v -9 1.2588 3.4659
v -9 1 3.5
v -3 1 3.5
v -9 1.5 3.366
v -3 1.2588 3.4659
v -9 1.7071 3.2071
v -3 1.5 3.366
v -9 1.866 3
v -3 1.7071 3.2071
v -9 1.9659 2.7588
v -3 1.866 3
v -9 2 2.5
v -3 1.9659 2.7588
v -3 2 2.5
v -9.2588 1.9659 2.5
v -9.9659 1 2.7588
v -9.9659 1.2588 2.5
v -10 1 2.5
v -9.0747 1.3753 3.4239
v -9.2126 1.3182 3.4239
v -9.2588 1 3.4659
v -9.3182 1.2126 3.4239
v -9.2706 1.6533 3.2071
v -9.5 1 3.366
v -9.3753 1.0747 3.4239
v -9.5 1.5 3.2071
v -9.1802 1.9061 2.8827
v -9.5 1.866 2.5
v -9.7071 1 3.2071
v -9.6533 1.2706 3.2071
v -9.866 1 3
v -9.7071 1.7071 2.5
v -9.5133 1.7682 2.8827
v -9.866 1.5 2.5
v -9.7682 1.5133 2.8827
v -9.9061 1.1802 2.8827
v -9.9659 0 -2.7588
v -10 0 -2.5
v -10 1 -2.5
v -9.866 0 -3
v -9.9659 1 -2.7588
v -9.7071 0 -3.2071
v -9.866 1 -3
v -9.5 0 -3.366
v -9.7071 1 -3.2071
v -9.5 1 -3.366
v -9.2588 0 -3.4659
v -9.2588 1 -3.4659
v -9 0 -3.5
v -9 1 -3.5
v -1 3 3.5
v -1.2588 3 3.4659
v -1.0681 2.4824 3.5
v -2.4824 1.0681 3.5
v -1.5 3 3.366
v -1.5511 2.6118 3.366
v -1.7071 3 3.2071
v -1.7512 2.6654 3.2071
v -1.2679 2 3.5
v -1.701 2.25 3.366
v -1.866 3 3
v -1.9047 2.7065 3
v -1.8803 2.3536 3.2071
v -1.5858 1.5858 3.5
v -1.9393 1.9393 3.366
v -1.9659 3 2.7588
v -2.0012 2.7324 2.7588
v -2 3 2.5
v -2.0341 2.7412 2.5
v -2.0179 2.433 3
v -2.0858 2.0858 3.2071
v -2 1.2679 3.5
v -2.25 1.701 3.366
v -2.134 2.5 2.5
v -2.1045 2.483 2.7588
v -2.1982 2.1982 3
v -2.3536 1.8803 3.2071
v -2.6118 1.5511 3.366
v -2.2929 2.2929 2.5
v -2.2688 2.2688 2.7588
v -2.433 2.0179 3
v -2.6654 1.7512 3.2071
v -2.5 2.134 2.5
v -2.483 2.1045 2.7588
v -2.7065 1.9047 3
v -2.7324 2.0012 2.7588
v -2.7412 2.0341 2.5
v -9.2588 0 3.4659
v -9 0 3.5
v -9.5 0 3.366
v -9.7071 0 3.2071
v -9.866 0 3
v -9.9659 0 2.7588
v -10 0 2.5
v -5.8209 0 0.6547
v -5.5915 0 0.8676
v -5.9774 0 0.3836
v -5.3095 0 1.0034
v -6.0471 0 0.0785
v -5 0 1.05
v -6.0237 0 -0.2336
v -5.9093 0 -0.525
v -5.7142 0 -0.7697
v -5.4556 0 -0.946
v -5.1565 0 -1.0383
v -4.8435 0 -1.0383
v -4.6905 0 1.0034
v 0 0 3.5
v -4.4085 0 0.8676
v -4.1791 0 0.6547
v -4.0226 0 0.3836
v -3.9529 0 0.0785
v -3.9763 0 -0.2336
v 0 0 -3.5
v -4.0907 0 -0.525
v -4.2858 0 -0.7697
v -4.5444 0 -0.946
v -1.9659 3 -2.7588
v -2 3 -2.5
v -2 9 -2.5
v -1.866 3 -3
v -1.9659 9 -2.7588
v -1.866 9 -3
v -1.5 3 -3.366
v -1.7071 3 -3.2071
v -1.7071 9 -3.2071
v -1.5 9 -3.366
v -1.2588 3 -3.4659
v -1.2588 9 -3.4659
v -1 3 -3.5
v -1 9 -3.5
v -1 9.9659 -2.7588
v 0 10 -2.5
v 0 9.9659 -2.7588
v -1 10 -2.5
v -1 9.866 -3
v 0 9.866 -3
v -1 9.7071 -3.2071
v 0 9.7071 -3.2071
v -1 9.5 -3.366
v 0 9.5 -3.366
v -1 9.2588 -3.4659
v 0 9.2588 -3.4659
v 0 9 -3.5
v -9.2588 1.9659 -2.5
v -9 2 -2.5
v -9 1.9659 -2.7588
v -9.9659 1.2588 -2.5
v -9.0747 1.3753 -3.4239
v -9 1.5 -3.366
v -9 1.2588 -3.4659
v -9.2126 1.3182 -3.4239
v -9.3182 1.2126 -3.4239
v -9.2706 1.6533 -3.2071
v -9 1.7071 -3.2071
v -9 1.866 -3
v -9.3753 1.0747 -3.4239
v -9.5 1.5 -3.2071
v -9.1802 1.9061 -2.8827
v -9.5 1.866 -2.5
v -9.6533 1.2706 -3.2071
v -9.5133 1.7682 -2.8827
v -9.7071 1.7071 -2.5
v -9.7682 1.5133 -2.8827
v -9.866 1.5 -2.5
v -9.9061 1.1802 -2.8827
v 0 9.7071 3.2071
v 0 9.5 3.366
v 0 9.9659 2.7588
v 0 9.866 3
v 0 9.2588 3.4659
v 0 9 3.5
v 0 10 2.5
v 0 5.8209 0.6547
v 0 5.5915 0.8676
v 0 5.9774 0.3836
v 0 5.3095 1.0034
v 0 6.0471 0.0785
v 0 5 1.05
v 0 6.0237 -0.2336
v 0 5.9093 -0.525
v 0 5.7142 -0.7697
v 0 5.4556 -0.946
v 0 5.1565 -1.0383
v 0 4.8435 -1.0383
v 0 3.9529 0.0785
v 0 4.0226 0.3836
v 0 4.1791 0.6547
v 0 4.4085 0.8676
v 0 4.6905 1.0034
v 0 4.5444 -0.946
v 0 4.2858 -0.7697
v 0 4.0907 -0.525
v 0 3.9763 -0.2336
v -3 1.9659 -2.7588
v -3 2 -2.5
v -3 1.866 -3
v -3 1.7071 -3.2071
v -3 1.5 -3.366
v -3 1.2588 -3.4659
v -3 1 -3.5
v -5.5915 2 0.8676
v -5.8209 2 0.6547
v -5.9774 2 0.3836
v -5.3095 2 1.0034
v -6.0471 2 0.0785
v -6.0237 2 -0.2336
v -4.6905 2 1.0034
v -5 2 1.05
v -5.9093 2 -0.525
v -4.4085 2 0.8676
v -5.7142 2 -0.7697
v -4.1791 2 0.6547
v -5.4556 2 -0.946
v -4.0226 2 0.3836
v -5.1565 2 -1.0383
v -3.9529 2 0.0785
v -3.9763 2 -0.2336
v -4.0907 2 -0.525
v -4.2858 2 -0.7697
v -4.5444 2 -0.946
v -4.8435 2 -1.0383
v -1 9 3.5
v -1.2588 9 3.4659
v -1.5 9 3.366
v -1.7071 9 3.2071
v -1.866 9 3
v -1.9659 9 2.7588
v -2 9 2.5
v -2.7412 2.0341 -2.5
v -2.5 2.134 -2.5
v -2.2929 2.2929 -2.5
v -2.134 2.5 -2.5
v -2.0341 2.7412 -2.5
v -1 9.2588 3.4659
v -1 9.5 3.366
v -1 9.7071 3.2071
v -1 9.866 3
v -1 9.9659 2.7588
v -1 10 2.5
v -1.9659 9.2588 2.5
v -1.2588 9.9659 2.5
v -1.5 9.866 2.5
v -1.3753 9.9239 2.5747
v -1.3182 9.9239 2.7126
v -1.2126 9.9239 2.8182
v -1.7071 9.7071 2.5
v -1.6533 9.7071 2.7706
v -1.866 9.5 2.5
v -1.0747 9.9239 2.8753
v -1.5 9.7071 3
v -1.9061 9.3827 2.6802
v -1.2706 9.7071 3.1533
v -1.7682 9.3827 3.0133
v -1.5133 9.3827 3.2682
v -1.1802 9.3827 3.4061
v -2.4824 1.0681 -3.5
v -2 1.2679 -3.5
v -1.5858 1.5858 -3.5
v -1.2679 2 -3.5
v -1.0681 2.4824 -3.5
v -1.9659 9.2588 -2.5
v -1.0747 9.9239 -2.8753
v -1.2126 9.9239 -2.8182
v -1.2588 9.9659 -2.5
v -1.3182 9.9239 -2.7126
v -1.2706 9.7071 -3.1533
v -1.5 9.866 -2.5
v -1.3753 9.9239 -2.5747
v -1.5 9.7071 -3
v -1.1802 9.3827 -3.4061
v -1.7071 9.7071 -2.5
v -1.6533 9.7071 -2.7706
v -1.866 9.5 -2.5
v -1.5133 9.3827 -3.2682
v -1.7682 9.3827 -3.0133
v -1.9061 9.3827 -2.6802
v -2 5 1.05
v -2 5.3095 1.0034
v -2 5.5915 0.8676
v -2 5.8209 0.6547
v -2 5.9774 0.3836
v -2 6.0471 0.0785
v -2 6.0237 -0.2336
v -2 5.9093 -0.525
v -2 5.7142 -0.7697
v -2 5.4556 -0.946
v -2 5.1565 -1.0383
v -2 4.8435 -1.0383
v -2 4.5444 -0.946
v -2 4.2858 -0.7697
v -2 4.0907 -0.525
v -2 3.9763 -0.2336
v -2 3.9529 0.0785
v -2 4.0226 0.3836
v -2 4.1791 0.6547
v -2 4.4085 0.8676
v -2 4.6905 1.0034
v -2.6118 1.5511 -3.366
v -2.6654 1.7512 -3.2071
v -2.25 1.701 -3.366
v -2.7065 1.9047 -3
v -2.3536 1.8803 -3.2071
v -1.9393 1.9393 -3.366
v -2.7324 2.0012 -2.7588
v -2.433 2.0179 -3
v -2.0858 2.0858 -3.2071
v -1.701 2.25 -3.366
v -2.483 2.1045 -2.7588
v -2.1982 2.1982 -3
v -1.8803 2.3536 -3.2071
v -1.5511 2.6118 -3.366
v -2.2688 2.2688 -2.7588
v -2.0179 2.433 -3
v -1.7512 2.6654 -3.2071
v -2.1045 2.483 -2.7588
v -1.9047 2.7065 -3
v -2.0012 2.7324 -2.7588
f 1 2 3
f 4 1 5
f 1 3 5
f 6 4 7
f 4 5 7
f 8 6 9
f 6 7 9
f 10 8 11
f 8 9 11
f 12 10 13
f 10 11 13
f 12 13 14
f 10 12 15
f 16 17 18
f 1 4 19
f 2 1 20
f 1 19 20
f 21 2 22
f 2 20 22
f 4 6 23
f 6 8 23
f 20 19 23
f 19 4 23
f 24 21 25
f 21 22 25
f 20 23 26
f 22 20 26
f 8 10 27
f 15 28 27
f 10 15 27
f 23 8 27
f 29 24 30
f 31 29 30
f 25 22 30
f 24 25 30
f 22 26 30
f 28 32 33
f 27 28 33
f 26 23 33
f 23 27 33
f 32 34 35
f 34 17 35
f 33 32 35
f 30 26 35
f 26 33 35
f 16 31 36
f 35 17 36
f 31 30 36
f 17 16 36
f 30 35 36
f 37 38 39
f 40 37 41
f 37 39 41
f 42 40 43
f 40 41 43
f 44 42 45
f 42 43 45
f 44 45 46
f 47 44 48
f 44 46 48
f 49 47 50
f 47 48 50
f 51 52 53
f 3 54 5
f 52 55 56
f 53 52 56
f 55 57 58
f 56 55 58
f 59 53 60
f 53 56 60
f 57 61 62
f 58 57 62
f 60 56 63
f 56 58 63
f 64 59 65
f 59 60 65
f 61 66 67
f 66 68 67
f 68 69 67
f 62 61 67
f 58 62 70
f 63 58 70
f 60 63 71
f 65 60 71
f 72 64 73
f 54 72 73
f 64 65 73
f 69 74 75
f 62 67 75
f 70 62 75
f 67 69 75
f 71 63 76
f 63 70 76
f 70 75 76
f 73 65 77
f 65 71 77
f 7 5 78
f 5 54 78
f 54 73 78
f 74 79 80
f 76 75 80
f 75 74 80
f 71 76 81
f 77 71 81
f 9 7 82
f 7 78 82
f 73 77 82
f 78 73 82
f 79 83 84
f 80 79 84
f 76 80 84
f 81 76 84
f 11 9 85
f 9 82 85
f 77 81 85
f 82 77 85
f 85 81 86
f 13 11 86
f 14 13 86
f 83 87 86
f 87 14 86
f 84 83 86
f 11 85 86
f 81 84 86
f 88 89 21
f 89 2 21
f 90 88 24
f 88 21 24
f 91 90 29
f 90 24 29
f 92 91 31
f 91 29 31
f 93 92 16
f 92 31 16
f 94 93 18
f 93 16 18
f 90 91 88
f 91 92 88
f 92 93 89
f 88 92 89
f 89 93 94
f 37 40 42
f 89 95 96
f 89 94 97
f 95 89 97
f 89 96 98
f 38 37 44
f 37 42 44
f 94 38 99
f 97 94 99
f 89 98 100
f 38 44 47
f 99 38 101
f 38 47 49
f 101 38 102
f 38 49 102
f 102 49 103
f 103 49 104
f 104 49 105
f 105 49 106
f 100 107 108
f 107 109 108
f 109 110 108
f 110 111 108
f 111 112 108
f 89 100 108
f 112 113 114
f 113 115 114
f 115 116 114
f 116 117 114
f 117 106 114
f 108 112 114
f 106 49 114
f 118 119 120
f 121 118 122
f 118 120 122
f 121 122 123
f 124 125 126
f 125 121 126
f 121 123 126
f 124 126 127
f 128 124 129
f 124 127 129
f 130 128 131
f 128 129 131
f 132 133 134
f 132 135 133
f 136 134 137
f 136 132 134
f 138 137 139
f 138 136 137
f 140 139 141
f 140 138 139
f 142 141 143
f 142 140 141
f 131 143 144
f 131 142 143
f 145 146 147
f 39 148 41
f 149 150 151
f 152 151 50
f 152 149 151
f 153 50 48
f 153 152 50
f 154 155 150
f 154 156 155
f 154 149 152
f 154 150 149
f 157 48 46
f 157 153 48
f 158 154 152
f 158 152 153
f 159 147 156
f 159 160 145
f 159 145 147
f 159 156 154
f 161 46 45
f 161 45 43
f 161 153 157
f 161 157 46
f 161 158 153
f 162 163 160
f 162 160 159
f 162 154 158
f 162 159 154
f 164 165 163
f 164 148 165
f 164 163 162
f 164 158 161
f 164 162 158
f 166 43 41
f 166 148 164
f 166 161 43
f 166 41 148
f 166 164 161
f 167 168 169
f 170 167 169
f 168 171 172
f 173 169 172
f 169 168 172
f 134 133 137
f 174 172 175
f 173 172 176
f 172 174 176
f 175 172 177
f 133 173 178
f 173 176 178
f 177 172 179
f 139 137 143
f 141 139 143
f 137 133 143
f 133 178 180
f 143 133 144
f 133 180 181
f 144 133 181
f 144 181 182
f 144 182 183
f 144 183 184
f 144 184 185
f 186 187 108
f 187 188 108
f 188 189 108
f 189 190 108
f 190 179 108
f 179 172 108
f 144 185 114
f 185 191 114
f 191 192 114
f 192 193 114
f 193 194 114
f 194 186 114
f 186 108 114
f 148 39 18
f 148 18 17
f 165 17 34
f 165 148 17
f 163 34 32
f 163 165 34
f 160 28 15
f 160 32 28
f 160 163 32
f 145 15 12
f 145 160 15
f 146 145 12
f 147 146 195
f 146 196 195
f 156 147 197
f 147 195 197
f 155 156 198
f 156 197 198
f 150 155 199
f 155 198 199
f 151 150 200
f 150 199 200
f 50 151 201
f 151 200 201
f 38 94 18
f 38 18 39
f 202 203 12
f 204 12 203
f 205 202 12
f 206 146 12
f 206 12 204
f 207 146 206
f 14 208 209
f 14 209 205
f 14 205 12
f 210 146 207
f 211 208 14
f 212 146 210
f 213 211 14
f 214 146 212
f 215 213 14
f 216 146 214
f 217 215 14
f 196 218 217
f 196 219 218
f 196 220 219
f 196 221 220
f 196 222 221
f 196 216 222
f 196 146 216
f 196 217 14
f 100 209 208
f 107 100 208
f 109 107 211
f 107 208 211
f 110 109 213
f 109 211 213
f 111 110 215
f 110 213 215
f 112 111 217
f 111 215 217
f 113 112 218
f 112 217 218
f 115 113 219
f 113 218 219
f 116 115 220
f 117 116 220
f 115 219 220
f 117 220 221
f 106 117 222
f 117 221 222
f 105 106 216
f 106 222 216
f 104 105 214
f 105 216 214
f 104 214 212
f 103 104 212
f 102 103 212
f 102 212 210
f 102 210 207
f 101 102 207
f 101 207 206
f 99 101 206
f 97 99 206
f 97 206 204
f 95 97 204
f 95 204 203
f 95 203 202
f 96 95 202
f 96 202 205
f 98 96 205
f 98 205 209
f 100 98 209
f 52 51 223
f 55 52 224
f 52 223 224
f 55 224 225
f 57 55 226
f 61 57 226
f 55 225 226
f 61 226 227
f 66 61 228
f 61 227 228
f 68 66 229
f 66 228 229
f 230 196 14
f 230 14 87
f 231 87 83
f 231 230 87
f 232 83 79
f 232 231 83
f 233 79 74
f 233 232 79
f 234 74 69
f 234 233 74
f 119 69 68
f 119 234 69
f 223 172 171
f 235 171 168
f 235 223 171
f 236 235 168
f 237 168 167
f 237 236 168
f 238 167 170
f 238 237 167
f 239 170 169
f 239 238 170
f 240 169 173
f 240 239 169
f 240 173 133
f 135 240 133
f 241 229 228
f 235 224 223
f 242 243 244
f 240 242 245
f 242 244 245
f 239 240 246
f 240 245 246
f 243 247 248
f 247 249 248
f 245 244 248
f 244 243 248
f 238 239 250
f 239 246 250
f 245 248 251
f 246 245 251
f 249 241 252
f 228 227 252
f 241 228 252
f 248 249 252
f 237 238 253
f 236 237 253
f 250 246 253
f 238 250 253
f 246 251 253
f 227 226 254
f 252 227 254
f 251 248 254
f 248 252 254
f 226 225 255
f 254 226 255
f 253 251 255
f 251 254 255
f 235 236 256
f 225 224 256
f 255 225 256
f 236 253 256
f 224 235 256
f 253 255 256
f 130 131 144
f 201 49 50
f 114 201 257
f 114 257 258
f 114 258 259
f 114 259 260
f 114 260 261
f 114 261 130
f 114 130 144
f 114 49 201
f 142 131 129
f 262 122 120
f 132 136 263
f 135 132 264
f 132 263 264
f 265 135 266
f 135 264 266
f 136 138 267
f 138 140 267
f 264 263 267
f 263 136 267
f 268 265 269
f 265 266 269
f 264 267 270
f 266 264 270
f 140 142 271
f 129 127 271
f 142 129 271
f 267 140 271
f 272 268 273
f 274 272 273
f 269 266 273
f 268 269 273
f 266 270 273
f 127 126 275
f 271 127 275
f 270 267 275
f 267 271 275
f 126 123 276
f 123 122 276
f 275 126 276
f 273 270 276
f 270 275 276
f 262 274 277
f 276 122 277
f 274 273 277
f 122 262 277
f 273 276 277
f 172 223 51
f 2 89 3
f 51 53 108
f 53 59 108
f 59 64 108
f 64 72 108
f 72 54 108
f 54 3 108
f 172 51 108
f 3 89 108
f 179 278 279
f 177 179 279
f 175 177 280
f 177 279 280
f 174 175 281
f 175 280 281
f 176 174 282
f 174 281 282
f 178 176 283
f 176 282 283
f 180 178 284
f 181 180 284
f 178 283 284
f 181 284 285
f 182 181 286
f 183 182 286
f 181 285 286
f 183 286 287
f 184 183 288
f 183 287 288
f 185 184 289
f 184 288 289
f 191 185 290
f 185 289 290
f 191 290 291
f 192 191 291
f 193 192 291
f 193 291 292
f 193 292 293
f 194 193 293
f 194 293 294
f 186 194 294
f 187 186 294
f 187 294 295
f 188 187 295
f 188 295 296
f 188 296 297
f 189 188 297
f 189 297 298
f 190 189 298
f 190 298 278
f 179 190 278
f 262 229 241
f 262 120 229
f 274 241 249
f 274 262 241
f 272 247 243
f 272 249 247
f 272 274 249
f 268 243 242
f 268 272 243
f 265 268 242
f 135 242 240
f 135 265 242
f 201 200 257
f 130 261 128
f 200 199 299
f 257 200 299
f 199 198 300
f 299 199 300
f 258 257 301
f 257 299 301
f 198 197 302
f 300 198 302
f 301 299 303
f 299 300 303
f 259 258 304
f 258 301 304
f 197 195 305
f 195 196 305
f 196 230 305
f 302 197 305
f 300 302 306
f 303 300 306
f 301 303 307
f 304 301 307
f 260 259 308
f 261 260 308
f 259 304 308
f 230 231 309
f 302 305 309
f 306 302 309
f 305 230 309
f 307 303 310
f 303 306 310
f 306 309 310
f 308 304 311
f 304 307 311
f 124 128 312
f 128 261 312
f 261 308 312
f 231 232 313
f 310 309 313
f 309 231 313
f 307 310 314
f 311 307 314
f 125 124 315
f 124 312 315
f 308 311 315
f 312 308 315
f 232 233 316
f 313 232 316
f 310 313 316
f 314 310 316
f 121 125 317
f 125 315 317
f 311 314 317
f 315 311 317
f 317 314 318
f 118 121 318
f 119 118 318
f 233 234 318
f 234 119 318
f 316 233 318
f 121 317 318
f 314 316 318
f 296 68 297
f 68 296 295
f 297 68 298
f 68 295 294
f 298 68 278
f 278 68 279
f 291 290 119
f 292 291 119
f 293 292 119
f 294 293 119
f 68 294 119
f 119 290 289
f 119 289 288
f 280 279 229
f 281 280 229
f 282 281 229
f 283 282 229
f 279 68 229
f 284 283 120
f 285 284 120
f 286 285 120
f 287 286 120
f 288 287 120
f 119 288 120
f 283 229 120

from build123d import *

# Parameters (mm, degrees)
SKETCH1_W           = 10
SKETCH1_H           = 7
BOSS_EXTRUDE1_DEPTH = 2
SKETCH2_W           = 7
SKETCH2_H           = 10
BOSS_EXTRUDE2_DEPTH = 2
SKETCH3_R           = 1.05
CUT_EXTRUDE1_DEPTH  = 14.275918047
SKETCH4_R           = 1.05
CUT_EXTRUDE2_DEPTH  = 14.275918047
FILLET1_R           = 1


with BuildPart() as part:
    # Sketch1 → Boss-Extrude1 (new body)
    with BuildSketch(Plane(origin=(0, 0, 0), x_dir=(1, 0, 0), z_dir=(0, 1, 0))):
        with Locations((-5, 0)):
            Rectangle(SKETCH1_W, SKETCH1_H)
    extrude(amount=BOSS_EXTRUDE1_DEPTH)

    # Sketch2 → Boss-Extrude2 (add)
    with BuildSketch(Plane(origin=(0, 0, 0), x_dir=(0, 0, -1), z_dir=(1, 0, 0))):
        with Locations((0, 5)):
            Rectangle(SKETCH2_W, SKETCH2_H)
    extrude(amount=-BOSS_EXTRUDE2_DEPTH)

    # Sketch3 → Cut-Extrude1 (cut, through all)
    with BuildSketch(Plane(origin=(0, 2, 0), x_dir=(1, 0, 0), z_dir=(0, 1, 0))):
        with Locations((-5, 0)):
            Circle(SKETCH3_R)
    extrude(amount=-CUT_EXTRUDE1_DEPTH, mode=Mode.SUBTRACT)

    # Sketch4 → Cut-Extrude2 (cut, through all)
    with BuildSketch(Plane.ZY.offset(2)):
        with Locations((0, 5)):
            Circle(SKETCH4_R)
    extrude(amount=-CUT_EXTRUDE2_DEPTH, mode=Mode.SUBTRACT)

    # Fillet1
    fillet1_edges = [part.edges().sort_by_distance(p)[0] for p in [
        (-2, 2, 0),
        (-6, 2, 3.5),
        (-2, 6, 3.5),
        (-2, 10, 0),
        (-6, 2, -3.5),
        (-2, 6, -3.5),
        (-10, 1, -3.5),
        (-10, 1, 3.5),
        (-1, 10, 3.5),
        (-1, 10, -3.5),
        (-10, 2, 0),
    ]]
    fillet(fillet1_edges, radius=FILLET1_R)


solid = part.part
